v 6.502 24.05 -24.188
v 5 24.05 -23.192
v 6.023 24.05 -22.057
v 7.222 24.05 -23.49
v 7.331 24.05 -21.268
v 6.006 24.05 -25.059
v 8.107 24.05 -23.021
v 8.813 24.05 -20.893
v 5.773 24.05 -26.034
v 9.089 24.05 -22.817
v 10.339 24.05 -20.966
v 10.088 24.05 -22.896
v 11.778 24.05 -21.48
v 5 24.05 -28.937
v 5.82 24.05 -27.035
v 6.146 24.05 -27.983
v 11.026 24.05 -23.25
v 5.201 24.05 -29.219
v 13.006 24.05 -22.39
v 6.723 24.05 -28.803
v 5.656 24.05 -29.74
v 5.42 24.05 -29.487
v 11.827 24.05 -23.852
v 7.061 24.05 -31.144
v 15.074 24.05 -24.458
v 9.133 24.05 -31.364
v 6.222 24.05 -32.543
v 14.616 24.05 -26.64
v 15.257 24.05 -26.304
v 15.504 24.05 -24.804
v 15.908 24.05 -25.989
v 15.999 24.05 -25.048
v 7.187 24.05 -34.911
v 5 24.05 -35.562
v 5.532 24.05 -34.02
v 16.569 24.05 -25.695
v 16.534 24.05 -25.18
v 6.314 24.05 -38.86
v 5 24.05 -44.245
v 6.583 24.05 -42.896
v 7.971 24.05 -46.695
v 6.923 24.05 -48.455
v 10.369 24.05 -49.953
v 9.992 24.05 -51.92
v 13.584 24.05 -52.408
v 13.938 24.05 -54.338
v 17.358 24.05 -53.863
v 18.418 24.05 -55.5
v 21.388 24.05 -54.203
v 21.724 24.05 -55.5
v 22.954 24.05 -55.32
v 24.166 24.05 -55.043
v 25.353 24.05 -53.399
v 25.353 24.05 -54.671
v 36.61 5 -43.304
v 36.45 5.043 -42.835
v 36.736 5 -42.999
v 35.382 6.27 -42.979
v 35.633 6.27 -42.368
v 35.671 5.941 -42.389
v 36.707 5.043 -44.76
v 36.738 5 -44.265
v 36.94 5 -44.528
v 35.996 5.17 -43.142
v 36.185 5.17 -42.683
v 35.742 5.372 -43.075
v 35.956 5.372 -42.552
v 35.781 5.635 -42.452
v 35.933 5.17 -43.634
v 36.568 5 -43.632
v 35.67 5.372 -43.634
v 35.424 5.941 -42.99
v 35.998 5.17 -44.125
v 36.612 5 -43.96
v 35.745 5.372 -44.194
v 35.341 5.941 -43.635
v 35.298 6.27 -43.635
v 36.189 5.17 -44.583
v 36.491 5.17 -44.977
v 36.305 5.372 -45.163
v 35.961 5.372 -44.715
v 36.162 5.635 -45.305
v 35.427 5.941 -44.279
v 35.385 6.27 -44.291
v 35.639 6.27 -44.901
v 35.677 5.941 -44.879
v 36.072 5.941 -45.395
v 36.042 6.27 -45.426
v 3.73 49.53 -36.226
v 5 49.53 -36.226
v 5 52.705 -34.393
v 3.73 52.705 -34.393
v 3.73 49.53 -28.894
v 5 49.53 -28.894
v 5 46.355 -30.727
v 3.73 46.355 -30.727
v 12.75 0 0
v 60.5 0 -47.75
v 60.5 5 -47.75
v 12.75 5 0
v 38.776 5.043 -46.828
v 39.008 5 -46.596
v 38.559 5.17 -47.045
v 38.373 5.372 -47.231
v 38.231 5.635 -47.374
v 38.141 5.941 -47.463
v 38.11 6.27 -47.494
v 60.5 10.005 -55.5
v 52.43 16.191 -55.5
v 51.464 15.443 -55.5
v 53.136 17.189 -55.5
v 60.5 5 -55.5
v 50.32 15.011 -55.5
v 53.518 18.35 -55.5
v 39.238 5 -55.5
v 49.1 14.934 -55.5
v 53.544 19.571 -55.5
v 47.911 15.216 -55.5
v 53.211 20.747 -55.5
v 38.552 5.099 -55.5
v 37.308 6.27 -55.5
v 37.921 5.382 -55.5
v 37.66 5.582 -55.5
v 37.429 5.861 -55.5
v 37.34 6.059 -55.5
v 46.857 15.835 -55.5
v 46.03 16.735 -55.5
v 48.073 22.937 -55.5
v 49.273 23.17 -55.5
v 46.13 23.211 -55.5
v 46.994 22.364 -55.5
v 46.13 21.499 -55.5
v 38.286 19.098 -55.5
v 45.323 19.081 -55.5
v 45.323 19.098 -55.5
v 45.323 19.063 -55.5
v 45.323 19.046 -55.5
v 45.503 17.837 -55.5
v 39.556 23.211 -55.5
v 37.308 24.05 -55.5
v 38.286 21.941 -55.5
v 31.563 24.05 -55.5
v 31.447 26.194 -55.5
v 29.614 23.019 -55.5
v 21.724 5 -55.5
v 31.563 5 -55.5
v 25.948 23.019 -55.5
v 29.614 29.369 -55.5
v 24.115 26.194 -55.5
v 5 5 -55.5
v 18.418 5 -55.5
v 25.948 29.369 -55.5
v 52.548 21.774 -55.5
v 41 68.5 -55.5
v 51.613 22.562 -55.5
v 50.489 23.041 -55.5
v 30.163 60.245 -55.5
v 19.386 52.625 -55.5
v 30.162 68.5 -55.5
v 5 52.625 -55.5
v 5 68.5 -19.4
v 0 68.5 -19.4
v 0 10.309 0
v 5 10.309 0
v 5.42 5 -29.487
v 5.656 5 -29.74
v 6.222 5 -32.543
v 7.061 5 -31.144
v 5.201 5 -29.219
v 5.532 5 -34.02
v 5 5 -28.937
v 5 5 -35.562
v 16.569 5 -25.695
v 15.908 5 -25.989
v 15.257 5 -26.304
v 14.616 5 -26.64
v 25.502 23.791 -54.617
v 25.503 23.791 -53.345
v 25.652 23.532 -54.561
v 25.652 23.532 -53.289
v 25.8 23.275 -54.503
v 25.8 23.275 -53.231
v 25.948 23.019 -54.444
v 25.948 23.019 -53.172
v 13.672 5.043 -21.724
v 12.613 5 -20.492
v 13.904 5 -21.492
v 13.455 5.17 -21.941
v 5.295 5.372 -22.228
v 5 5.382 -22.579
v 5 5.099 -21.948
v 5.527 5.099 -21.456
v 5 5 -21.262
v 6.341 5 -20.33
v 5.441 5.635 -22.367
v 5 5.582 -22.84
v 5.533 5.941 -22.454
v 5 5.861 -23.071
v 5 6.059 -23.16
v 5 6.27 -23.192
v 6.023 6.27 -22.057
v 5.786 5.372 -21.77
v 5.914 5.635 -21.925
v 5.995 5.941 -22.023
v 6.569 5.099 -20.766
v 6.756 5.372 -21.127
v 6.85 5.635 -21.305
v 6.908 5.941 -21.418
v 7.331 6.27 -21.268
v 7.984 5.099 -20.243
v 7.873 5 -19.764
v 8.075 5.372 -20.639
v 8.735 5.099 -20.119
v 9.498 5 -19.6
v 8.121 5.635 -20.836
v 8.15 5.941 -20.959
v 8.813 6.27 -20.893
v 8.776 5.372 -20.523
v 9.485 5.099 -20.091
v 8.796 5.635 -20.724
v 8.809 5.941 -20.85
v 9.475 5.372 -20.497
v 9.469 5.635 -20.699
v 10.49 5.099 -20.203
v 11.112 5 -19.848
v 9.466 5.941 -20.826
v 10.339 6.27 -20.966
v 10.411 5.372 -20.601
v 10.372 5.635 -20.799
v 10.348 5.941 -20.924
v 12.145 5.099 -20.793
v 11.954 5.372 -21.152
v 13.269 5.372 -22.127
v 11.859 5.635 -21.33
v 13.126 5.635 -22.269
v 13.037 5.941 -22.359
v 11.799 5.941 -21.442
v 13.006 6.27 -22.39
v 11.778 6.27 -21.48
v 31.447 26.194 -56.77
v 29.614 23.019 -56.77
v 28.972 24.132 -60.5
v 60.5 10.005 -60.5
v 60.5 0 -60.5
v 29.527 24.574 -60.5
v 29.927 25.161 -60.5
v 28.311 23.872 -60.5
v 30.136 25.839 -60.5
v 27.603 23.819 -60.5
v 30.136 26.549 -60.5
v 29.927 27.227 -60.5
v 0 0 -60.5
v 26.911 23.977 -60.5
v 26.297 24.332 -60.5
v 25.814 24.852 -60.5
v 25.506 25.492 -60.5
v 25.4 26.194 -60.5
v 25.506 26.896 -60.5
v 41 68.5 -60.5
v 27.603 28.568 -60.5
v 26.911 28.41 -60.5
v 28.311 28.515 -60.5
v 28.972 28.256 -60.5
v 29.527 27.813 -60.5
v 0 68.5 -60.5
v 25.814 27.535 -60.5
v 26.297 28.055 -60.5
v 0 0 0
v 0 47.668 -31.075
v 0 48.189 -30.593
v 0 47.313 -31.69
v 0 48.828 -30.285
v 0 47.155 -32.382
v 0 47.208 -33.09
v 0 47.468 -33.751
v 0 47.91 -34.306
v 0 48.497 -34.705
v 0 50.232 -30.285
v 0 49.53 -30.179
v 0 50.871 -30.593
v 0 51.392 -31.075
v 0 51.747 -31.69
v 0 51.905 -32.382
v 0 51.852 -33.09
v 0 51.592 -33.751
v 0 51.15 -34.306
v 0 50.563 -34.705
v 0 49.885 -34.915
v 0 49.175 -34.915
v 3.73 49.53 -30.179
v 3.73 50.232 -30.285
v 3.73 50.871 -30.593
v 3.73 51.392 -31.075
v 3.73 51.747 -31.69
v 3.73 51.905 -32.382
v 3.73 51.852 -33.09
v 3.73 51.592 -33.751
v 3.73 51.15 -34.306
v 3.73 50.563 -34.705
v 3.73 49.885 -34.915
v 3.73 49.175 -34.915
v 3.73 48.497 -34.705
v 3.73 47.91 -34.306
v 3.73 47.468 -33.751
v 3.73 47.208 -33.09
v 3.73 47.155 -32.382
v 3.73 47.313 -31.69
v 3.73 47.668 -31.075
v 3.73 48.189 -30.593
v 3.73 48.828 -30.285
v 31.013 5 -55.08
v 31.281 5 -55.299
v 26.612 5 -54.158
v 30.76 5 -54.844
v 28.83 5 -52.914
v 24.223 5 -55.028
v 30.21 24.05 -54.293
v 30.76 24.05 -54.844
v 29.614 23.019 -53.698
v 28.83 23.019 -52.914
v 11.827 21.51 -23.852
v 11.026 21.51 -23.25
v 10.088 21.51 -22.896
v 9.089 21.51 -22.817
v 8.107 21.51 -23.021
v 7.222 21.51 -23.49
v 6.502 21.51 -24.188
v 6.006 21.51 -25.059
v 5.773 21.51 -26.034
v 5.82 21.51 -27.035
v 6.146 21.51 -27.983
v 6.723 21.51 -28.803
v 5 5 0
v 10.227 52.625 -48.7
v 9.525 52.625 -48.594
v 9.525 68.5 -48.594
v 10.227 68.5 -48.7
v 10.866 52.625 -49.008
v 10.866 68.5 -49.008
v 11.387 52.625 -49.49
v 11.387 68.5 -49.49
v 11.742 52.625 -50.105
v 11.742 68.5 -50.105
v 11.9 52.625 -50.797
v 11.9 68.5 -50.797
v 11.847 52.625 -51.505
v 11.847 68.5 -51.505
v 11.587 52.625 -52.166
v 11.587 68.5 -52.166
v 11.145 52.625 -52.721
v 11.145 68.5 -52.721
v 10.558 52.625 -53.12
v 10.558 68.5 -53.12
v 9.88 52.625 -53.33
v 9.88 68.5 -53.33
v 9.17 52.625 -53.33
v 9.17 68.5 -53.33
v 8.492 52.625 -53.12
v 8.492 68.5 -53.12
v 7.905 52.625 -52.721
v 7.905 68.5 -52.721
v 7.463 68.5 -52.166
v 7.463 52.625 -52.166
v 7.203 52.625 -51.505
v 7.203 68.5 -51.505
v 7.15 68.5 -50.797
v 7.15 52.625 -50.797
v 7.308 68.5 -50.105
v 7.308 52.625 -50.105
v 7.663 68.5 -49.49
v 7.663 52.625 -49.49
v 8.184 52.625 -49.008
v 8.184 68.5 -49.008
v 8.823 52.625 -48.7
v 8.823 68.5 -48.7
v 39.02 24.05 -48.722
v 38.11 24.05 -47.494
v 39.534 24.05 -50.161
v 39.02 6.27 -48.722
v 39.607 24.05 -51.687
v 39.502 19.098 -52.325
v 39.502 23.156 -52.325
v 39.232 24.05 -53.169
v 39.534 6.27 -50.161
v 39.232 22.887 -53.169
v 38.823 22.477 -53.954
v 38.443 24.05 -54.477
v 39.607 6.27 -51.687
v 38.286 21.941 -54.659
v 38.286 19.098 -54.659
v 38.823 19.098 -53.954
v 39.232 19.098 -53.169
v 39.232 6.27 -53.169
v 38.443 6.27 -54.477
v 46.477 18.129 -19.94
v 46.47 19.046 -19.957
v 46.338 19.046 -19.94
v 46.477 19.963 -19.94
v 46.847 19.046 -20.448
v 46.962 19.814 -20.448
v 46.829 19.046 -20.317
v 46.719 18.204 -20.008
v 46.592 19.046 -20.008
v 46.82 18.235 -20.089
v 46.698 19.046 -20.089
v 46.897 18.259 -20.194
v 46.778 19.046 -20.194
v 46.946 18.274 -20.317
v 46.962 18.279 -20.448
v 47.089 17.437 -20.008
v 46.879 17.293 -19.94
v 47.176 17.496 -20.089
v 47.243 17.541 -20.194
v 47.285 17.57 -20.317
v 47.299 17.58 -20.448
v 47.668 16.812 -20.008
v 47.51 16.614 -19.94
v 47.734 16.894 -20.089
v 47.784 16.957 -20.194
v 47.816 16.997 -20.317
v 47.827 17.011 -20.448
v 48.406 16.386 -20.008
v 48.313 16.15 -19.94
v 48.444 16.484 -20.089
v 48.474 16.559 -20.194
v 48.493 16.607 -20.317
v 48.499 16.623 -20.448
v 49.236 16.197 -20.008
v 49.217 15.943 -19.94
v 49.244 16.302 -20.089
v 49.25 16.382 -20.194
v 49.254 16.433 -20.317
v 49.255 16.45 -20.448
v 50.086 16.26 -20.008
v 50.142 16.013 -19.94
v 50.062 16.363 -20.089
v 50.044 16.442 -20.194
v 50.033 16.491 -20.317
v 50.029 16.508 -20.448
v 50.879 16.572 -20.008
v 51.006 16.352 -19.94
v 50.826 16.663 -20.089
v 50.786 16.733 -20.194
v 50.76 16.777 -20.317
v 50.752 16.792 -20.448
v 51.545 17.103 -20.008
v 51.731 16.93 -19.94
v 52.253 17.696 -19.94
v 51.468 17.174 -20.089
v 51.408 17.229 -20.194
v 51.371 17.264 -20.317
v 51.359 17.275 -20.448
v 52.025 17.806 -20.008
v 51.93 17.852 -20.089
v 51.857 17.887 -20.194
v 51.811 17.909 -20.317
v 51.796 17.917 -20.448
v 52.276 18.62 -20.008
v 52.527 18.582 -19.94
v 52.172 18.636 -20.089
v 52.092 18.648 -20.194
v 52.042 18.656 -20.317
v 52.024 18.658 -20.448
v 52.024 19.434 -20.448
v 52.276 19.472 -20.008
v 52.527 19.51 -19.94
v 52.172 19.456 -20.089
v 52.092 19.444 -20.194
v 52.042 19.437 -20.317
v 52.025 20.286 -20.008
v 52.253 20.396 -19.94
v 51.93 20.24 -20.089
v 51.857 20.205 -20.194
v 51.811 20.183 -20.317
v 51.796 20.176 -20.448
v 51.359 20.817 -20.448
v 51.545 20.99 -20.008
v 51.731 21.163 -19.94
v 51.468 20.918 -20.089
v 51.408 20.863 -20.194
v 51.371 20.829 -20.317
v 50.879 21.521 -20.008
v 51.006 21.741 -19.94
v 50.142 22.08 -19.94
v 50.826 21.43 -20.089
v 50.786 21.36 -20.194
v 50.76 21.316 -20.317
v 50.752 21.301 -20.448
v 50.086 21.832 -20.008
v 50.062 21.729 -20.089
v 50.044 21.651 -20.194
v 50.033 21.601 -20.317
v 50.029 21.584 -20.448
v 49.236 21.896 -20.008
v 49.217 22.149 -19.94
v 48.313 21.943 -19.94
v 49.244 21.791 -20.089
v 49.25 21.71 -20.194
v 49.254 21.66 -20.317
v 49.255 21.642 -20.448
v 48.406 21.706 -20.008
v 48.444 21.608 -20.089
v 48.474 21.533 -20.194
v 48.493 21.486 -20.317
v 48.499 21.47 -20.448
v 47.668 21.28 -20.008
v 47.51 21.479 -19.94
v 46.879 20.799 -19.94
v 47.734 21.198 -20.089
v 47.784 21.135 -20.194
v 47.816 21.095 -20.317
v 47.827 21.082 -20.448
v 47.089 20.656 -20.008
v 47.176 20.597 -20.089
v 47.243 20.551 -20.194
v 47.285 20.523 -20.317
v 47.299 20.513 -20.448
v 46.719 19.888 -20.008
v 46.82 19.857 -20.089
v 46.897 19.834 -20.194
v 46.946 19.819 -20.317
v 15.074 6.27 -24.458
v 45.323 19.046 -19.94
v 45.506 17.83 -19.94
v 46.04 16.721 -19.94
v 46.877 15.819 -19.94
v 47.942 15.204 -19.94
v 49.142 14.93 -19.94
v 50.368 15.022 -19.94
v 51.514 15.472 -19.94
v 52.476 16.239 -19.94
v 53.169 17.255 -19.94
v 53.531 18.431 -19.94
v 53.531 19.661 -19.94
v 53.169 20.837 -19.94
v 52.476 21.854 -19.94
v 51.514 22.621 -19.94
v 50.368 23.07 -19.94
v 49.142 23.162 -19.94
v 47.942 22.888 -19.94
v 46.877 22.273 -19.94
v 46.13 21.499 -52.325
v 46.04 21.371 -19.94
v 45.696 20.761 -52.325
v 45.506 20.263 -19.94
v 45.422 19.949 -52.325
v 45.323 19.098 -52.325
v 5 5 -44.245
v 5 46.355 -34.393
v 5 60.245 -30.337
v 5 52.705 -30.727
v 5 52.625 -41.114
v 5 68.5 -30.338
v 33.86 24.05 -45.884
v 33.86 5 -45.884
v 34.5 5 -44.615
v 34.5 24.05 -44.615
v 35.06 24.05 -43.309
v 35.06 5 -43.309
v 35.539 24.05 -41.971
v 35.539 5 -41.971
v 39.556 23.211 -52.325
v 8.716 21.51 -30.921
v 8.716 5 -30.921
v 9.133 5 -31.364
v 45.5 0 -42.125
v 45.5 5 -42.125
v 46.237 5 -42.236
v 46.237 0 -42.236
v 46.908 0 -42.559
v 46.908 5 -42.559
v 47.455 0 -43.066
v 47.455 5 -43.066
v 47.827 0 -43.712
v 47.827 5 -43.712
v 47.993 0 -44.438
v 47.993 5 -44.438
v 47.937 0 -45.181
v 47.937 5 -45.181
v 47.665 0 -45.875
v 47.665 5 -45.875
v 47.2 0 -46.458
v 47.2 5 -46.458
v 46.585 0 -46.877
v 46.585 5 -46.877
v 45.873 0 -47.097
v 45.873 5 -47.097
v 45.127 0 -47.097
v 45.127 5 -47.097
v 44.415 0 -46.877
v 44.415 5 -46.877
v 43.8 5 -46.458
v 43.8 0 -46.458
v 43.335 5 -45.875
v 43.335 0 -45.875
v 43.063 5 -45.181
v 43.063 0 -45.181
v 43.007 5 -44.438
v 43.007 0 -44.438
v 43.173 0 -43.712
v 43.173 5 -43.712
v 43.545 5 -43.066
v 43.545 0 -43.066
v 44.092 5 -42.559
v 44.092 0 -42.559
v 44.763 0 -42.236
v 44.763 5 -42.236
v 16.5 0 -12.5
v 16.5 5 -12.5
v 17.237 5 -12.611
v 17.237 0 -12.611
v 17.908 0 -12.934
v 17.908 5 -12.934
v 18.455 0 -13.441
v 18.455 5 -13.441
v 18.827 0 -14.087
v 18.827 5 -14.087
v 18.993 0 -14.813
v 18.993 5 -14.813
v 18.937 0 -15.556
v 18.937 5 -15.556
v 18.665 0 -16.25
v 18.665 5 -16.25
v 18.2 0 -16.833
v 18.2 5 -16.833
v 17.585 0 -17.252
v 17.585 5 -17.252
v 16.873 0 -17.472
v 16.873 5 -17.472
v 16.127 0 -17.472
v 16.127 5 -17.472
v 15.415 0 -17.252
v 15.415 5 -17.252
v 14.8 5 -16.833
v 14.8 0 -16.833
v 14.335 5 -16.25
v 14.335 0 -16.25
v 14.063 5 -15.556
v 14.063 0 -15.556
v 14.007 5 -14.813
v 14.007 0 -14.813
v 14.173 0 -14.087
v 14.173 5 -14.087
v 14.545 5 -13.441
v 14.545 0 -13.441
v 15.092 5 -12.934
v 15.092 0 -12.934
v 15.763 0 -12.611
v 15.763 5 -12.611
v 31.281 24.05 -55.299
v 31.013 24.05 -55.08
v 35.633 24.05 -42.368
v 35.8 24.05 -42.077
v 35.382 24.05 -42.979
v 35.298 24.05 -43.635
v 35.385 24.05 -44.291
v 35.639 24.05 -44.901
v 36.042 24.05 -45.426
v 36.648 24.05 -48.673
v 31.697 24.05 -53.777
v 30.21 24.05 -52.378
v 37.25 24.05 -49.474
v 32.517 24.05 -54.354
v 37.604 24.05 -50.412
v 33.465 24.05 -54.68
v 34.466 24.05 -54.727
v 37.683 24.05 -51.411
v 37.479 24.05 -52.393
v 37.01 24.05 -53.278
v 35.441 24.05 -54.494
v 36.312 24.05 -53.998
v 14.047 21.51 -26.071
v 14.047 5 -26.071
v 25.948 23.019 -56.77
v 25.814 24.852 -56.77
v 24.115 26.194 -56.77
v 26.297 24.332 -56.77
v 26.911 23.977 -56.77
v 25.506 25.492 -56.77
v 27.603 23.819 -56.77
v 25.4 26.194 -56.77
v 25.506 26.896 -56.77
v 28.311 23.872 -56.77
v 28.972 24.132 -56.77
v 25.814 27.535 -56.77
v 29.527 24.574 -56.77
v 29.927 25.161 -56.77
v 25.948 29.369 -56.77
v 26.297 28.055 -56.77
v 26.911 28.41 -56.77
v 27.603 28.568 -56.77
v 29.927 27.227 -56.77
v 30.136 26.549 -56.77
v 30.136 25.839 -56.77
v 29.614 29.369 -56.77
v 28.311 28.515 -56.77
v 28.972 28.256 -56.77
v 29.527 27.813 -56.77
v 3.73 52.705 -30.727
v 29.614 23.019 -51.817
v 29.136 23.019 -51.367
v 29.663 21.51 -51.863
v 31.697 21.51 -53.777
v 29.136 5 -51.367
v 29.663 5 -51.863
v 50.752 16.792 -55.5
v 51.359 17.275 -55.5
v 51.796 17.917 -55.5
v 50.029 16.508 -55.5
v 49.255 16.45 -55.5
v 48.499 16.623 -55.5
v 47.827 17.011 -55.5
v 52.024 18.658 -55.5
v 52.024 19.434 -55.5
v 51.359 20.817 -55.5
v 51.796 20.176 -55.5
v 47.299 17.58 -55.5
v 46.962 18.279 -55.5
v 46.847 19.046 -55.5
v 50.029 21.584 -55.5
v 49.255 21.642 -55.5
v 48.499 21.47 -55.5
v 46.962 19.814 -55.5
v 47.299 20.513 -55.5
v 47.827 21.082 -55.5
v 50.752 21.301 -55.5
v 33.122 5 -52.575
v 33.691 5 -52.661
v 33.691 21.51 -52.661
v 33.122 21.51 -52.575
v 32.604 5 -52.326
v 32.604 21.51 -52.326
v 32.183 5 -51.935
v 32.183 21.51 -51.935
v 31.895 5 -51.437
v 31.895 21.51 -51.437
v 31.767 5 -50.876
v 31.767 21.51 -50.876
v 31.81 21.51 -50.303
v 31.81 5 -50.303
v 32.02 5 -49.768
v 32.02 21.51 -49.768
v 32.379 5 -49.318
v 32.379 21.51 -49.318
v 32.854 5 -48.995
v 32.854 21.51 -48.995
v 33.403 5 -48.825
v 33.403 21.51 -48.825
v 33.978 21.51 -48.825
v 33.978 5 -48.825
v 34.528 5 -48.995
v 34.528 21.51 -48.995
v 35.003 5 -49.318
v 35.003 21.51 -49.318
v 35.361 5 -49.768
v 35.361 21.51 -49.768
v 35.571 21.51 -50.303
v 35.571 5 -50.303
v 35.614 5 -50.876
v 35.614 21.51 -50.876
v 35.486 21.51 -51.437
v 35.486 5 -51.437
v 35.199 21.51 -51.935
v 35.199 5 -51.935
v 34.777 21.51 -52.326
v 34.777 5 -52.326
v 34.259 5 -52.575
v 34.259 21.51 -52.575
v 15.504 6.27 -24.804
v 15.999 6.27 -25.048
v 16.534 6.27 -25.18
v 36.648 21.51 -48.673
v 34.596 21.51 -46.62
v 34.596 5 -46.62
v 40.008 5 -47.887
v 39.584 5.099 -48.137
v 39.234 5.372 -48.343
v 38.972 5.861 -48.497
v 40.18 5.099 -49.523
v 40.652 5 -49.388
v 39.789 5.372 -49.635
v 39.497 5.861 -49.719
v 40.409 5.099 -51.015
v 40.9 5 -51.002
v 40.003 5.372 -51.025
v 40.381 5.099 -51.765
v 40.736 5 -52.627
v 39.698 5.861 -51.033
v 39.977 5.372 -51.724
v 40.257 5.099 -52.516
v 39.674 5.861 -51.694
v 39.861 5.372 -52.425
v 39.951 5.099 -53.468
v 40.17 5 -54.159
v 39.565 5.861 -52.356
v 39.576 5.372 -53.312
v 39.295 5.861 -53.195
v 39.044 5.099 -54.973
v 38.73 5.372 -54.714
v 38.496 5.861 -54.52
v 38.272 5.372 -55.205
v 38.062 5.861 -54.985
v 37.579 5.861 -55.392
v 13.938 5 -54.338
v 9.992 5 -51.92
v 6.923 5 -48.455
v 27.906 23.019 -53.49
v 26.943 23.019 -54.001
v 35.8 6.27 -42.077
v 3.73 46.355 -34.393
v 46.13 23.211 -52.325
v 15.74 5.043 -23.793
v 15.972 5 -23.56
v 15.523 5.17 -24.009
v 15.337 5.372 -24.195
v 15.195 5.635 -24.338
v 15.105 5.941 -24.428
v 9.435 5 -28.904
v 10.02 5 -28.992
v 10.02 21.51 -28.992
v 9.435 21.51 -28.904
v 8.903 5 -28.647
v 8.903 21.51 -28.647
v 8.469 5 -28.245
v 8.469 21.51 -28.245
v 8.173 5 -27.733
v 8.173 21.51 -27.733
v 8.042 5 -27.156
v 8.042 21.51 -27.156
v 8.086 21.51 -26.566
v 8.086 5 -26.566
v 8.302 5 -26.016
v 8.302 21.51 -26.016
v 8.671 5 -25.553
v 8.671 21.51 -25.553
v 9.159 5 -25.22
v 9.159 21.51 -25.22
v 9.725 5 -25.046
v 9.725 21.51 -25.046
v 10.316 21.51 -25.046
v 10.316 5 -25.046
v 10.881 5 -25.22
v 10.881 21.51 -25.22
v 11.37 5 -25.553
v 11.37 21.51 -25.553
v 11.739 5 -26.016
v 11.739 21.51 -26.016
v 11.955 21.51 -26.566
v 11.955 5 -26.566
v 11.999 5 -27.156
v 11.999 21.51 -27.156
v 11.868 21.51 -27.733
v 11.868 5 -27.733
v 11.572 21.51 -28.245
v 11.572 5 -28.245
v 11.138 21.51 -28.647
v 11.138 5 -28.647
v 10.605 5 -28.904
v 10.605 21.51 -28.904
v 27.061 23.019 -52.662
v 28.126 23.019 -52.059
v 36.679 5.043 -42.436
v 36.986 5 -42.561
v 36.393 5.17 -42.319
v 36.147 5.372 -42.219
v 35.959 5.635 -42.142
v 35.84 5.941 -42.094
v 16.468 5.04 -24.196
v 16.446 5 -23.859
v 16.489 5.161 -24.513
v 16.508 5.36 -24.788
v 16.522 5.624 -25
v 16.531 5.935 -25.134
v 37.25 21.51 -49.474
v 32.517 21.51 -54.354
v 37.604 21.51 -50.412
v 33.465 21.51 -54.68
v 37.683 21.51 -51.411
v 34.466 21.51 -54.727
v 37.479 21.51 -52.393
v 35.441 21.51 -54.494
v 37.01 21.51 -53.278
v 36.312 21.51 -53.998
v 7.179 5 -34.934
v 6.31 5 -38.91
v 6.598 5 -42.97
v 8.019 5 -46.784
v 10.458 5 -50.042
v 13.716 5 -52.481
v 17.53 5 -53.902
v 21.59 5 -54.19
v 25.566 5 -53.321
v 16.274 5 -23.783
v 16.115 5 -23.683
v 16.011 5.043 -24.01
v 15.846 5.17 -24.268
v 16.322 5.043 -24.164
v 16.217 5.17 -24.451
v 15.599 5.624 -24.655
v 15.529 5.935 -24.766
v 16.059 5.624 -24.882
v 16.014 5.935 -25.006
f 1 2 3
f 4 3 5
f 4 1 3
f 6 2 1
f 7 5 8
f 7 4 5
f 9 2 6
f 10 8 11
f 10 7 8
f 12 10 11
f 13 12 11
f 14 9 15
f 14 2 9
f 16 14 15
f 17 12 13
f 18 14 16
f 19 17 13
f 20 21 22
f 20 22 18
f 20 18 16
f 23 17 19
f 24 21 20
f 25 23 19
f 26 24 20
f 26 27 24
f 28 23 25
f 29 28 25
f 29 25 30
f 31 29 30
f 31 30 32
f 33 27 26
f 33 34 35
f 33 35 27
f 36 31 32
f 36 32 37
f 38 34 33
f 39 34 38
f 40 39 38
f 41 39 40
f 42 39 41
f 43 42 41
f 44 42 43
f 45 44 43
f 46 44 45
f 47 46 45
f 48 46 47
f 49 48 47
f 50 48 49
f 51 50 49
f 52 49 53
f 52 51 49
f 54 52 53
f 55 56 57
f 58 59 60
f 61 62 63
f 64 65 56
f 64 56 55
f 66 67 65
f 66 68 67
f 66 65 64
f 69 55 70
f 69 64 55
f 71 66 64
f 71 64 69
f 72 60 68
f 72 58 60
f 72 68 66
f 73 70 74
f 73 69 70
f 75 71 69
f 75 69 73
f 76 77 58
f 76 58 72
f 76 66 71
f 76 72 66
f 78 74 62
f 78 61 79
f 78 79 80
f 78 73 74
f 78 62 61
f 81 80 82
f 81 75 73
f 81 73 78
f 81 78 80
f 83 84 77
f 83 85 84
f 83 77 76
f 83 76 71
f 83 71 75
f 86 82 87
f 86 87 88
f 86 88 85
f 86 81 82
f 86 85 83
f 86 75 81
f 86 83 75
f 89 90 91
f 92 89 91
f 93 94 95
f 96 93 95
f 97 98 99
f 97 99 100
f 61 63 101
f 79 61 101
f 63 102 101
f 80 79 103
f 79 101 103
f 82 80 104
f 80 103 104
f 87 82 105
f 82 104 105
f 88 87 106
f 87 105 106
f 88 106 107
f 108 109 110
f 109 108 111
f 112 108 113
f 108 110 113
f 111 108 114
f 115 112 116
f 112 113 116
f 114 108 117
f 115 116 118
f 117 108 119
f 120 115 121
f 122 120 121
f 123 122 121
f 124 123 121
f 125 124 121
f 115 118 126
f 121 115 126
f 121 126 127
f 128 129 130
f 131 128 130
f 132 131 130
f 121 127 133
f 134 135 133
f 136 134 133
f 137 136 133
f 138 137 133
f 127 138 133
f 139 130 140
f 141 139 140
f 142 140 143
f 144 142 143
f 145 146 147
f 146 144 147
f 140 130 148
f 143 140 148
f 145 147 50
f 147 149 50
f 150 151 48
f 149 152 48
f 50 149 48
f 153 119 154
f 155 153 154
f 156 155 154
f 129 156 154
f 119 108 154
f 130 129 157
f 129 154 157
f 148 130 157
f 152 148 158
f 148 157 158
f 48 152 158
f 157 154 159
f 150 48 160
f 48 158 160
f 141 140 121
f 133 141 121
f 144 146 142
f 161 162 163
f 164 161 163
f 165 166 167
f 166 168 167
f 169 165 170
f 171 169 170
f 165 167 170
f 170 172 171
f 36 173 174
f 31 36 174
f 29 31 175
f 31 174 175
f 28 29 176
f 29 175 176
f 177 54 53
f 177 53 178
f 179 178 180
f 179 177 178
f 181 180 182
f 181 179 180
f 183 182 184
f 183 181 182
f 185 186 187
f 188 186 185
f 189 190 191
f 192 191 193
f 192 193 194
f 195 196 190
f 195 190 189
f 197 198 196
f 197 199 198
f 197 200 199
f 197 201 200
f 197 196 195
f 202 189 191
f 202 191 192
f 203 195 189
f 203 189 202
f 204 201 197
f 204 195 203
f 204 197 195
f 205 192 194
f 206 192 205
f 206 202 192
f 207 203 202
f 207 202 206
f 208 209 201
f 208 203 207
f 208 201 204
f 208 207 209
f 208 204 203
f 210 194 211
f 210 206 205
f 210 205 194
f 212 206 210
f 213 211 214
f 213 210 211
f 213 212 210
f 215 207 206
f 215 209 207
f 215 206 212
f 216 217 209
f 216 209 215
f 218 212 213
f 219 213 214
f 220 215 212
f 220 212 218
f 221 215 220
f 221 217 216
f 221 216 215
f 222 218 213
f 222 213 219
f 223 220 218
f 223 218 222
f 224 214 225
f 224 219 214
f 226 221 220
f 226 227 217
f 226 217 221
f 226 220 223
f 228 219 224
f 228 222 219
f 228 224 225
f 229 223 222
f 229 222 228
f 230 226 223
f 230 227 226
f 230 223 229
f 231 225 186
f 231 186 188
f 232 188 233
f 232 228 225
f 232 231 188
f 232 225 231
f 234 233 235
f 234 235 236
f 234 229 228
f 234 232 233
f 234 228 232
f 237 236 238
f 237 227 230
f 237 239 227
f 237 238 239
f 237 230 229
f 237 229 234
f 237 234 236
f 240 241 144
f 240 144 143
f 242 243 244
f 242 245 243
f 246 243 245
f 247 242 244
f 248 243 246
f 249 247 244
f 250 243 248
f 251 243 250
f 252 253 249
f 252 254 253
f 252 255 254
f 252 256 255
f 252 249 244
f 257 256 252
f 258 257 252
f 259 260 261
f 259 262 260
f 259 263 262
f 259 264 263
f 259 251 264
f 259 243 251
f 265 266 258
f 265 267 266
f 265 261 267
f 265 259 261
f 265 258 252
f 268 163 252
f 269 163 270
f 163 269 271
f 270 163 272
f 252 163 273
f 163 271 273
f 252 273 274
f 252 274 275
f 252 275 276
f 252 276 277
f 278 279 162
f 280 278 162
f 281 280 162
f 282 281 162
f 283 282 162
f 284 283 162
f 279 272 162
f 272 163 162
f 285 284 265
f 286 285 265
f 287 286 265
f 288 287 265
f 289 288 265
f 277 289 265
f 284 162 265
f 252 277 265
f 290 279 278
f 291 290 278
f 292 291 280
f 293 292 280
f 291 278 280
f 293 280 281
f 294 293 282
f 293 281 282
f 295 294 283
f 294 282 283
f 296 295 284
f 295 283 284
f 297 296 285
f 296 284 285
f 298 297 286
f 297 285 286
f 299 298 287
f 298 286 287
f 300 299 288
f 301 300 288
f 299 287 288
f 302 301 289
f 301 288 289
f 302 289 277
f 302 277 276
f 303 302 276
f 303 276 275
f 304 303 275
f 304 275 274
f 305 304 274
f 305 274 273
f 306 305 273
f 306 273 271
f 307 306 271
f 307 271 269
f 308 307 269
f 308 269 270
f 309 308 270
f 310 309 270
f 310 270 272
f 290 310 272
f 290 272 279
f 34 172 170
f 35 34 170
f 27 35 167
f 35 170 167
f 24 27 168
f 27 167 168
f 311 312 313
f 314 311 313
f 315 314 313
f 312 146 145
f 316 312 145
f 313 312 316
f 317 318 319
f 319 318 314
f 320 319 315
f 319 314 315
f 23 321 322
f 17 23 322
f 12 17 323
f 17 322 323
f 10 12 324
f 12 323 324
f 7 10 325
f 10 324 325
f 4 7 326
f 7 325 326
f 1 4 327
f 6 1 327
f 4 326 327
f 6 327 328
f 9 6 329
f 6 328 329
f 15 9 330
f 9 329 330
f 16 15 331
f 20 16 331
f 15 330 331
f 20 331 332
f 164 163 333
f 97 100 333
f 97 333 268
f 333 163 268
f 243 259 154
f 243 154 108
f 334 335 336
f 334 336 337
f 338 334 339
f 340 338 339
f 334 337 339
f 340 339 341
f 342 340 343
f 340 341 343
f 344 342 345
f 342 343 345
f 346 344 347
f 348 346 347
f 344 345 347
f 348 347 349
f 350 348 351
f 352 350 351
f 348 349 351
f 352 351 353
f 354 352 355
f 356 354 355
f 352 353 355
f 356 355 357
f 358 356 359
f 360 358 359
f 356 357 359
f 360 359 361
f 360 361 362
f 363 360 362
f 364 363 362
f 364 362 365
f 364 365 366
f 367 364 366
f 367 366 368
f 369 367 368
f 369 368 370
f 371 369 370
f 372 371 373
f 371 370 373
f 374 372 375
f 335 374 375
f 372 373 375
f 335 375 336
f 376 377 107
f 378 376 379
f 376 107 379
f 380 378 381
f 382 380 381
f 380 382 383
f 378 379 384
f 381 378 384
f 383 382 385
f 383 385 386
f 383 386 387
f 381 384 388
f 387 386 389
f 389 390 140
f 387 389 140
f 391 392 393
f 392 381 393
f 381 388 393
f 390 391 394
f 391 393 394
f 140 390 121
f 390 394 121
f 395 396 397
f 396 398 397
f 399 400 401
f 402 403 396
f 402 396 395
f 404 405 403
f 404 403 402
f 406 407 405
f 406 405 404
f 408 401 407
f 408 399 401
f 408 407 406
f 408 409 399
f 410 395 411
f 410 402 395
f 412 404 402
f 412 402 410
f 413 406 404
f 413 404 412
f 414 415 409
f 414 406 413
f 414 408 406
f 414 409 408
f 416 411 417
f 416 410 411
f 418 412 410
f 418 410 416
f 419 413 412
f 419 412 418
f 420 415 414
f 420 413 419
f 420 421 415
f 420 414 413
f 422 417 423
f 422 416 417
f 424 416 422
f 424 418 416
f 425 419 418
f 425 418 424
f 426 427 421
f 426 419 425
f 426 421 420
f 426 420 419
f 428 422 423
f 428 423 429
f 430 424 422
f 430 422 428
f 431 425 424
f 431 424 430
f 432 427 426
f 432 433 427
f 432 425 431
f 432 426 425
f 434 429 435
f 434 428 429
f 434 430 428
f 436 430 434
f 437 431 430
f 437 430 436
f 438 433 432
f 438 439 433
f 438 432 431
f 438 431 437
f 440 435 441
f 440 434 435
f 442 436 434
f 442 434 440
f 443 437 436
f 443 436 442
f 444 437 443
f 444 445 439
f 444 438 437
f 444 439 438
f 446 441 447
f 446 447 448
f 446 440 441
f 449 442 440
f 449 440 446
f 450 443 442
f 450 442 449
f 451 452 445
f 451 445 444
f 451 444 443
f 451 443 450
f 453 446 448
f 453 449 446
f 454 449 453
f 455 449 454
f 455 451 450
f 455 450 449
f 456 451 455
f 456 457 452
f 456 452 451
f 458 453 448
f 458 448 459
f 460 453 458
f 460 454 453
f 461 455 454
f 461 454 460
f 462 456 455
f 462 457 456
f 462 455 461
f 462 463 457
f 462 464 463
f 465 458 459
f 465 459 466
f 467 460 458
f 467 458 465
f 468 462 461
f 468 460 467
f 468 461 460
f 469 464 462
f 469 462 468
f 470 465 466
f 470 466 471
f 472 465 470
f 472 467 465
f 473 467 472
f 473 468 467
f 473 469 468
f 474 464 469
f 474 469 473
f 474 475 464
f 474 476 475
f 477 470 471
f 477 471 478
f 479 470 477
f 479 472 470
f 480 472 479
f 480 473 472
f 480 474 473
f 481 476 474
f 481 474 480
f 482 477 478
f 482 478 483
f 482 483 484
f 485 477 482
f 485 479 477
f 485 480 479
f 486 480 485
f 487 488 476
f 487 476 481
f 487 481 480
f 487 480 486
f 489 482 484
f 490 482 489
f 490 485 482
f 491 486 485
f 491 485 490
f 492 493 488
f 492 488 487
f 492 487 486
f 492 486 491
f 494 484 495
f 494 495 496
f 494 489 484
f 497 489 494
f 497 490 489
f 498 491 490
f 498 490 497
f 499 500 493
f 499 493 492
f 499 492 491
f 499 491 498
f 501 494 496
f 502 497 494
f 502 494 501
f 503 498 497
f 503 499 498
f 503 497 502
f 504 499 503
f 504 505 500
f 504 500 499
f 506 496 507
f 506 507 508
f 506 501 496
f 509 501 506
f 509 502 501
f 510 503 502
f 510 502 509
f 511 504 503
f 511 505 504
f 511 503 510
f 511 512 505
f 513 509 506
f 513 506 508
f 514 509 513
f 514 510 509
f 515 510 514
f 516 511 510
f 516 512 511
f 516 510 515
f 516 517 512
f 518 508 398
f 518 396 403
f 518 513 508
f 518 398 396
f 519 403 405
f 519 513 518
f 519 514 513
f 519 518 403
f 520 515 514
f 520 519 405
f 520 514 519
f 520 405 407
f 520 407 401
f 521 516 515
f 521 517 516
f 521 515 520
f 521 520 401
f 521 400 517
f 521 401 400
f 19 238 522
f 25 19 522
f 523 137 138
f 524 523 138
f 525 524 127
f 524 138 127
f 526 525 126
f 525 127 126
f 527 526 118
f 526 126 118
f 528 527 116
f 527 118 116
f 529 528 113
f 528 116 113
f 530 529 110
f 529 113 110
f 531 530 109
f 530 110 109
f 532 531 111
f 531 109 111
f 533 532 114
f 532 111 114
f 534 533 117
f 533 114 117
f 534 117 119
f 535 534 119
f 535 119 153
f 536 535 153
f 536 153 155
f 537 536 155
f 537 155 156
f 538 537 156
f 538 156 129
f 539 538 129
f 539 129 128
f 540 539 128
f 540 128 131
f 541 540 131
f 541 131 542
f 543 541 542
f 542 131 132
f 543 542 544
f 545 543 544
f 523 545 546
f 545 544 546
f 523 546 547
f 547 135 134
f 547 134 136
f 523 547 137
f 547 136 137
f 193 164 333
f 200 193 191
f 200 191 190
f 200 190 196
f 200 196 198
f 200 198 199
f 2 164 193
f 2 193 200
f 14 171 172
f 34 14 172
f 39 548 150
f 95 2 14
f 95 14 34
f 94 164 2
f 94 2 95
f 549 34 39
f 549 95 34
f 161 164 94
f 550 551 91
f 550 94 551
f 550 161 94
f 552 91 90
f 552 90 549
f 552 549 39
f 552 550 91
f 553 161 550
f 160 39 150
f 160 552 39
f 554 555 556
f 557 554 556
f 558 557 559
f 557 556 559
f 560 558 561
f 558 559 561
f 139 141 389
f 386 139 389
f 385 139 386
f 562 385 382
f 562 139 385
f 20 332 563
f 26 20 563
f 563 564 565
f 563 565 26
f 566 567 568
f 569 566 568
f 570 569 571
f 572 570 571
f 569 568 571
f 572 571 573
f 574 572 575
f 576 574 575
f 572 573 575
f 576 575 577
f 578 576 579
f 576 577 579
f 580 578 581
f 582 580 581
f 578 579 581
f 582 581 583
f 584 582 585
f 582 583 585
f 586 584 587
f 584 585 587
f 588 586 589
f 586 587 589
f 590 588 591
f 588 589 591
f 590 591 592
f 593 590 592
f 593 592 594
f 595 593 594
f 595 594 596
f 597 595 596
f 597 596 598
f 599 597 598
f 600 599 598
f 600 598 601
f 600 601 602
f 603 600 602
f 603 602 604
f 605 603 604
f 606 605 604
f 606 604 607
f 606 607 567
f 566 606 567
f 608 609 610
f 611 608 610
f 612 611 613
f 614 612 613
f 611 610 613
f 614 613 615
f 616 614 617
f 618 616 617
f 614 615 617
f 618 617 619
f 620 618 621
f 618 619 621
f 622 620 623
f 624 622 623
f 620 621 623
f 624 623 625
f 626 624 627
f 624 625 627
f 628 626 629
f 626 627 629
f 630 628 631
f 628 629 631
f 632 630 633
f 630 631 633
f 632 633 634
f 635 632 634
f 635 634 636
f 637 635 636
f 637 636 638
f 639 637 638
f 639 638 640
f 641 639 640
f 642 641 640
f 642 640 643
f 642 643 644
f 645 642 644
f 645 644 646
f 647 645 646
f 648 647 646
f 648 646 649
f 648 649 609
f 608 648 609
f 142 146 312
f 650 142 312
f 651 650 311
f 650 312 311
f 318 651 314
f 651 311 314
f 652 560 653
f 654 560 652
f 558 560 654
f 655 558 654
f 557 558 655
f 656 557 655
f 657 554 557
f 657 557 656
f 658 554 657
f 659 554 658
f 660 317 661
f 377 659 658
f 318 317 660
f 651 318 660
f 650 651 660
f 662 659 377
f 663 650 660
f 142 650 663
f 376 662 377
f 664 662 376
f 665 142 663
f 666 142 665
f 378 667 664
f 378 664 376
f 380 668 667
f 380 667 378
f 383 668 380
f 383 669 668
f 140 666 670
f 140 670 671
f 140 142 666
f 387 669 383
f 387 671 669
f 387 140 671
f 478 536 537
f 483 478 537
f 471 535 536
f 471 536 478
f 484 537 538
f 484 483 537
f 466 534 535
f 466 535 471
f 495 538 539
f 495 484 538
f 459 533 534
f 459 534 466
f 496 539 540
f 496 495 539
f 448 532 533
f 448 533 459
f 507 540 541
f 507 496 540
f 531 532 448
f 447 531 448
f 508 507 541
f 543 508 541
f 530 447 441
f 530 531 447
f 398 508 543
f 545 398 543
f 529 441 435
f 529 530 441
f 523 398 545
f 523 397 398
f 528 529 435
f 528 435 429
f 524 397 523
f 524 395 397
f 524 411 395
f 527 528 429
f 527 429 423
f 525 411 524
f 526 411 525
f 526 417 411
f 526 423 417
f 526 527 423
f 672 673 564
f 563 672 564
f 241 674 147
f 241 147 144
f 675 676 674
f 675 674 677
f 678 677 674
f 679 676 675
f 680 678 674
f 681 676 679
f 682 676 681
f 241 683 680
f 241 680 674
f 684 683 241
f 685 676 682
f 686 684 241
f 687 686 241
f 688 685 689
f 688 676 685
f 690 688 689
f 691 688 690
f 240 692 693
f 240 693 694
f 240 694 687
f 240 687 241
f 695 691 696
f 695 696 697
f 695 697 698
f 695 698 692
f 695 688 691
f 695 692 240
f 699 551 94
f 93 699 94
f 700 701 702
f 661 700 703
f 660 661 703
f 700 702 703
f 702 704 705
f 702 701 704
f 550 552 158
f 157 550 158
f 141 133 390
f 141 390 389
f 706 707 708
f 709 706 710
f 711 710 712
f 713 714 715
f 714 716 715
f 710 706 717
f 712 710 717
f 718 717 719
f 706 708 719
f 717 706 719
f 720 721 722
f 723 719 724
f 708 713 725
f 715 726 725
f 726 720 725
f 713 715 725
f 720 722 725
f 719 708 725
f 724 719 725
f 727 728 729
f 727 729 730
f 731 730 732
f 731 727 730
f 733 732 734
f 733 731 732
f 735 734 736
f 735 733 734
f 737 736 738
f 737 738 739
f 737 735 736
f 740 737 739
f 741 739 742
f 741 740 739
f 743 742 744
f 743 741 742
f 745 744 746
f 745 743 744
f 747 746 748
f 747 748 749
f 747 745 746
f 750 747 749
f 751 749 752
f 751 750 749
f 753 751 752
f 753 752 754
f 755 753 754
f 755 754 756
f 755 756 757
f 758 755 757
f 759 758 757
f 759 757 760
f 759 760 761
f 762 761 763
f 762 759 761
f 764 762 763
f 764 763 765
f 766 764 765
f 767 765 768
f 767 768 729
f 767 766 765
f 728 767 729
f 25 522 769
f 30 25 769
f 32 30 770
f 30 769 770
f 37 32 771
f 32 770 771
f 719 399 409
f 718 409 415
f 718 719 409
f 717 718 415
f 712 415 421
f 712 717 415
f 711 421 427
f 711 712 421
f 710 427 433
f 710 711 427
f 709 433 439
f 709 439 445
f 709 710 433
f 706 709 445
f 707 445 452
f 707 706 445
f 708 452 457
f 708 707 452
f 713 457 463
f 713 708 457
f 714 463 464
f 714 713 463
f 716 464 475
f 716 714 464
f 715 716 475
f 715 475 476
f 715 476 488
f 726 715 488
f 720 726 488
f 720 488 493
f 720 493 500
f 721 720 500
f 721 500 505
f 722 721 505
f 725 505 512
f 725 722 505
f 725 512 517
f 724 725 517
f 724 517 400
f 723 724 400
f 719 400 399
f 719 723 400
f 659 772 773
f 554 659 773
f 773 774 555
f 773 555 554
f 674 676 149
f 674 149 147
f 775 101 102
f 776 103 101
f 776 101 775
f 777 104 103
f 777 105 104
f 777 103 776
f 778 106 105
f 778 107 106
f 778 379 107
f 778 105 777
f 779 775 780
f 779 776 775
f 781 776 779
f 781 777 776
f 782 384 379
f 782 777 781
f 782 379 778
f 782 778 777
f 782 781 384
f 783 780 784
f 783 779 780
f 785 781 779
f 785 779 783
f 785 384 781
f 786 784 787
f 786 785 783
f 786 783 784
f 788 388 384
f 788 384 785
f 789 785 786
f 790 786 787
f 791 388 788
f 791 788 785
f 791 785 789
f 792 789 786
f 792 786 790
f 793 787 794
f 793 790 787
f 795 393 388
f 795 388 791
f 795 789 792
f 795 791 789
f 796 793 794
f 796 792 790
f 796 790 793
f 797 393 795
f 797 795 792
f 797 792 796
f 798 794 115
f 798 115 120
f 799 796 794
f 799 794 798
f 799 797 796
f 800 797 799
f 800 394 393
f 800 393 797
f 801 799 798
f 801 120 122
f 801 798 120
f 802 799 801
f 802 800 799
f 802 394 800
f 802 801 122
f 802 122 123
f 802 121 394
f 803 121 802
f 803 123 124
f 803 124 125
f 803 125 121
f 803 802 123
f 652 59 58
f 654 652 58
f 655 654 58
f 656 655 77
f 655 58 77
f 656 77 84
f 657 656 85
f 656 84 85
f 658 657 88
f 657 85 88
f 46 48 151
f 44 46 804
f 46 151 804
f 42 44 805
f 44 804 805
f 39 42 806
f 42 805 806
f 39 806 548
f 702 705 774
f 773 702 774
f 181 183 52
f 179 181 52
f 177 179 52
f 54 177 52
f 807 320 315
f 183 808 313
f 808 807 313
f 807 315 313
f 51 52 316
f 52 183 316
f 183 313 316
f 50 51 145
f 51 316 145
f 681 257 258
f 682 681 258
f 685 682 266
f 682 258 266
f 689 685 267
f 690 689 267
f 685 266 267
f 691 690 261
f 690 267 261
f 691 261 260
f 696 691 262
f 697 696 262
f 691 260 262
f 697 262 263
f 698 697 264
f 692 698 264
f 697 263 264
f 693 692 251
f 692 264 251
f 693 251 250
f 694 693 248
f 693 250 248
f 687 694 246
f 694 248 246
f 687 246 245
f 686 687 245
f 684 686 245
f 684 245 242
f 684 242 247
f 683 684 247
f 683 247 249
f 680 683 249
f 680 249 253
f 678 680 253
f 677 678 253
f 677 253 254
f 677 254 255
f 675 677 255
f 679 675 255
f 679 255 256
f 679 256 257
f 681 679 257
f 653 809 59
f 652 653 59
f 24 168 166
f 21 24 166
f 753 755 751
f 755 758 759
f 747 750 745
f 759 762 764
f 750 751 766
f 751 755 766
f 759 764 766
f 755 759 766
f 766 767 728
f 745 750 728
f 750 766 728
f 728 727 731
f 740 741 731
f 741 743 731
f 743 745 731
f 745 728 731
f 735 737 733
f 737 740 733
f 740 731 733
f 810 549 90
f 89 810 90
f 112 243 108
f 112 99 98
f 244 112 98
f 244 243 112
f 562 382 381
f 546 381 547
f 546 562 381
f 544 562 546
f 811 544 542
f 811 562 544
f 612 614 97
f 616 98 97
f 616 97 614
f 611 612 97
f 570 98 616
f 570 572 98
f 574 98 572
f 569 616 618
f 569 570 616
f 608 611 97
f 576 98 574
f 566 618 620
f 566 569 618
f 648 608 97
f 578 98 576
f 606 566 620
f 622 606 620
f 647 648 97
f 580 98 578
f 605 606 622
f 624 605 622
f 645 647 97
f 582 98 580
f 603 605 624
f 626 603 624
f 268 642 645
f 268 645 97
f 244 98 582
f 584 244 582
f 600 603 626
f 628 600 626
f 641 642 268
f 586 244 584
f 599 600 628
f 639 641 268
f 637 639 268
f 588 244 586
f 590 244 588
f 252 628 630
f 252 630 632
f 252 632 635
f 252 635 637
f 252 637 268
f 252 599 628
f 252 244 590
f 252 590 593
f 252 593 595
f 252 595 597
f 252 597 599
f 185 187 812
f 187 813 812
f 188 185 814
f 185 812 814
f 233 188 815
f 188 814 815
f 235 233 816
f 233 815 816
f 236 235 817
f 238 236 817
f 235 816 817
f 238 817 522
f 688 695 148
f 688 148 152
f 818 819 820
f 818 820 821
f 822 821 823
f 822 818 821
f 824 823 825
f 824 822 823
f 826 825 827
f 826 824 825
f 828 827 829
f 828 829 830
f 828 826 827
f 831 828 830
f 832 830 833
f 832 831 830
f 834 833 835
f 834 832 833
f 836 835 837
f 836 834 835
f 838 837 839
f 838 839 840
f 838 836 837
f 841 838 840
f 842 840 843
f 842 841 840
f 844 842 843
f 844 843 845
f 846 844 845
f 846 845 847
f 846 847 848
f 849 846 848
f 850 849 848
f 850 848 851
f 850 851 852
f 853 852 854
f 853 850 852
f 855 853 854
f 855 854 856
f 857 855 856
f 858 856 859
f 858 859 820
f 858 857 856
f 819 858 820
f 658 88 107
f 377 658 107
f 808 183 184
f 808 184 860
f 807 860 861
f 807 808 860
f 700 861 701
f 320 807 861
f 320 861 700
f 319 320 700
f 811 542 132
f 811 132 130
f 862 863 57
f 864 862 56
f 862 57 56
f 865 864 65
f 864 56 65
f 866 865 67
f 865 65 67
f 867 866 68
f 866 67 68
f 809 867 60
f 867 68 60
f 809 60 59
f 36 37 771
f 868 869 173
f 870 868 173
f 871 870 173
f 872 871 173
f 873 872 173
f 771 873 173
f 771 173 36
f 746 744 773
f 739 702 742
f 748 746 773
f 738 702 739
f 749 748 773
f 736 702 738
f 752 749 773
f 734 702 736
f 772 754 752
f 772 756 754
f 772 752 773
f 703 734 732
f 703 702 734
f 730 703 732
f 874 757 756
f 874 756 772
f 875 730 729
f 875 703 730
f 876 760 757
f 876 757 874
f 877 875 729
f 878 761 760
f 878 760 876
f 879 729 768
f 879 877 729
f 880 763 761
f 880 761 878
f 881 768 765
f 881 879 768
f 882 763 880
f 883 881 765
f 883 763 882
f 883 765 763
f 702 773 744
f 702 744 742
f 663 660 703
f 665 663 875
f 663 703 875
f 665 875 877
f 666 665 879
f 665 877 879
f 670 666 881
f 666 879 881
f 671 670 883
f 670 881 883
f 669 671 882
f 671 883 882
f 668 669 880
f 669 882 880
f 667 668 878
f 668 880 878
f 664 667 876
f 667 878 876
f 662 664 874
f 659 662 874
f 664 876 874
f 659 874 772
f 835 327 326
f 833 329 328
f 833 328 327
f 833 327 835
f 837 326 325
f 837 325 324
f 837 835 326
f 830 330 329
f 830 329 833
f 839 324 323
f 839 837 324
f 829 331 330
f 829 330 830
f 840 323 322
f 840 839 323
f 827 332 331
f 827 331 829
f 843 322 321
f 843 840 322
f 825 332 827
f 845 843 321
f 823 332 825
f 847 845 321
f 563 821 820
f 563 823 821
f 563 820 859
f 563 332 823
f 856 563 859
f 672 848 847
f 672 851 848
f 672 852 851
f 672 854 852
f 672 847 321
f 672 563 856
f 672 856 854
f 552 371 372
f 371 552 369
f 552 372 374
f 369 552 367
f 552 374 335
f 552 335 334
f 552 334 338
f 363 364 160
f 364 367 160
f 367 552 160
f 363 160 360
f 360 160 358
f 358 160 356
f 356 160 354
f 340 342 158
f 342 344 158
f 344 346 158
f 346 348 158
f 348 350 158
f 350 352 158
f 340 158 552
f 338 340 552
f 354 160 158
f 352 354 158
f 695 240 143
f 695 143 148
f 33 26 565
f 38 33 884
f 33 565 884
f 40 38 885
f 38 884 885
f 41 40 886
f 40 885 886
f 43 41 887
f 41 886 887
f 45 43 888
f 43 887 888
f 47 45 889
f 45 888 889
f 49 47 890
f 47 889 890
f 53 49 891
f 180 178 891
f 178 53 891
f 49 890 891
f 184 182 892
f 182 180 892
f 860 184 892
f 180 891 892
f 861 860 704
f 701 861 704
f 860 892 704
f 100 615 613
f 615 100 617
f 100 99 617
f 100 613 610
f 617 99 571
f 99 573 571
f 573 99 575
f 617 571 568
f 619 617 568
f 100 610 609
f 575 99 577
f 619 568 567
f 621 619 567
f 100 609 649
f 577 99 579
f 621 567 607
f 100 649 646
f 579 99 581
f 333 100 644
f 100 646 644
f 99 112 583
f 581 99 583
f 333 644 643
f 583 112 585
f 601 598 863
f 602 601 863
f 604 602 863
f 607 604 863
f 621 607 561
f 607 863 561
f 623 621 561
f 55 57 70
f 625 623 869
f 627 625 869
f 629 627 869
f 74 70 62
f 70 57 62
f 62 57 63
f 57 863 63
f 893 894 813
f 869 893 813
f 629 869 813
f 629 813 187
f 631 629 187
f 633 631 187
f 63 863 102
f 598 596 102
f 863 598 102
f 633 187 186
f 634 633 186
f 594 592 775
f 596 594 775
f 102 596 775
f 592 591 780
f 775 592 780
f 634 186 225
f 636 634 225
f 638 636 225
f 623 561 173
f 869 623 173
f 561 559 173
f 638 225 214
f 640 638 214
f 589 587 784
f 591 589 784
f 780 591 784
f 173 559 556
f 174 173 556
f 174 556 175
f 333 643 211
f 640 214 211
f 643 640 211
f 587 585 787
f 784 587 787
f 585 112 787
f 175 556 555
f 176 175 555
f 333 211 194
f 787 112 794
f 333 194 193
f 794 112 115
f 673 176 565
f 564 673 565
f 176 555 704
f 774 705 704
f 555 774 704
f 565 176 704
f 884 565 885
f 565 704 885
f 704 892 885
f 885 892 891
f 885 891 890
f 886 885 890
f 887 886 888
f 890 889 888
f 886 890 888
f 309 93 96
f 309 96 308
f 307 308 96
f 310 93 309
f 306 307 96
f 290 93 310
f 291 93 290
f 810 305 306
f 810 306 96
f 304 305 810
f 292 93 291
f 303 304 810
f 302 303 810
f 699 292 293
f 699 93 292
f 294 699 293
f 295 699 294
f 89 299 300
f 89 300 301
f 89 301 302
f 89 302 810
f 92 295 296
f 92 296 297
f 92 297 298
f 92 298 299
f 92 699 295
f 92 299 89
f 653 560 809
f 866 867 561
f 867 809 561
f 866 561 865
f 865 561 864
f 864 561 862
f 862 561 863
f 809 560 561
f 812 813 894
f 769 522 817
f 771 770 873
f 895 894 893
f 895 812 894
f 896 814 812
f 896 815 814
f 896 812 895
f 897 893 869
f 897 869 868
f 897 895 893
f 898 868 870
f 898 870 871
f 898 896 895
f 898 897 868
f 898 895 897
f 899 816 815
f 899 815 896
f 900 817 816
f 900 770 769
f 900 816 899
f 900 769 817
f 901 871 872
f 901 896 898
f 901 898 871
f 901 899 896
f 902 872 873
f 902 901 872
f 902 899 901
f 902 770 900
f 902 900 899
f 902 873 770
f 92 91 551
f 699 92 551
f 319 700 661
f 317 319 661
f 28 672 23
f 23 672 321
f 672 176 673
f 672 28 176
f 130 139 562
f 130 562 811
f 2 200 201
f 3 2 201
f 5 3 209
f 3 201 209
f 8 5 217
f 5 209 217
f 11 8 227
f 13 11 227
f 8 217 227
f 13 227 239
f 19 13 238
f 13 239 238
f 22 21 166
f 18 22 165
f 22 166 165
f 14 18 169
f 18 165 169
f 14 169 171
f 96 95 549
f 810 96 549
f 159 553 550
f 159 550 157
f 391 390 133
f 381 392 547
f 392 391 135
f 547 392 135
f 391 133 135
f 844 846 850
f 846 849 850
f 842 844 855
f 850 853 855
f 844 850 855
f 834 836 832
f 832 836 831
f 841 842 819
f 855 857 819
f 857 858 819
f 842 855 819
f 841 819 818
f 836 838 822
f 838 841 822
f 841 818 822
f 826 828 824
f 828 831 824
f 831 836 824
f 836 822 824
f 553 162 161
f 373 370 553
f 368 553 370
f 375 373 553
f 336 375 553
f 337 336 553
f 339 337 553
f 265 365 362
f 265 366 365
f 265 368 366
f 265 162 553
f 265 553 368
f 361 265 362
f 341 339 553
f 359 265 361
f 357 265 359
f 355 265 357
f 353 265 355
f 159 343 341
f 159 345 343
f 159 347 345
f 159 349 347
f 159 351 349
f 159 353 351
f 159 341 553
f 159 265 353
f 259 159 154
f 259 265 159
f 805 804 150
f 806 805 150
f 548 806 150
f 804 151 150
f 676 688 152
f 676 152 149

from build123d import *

# Parameters (mm, degrees)
BOSS_EXTRUDE1_DEPTH     = 5
BOSS_EXTRUDE2_DEPTH     = 5
BOSS_EXTRUDE3_DEPTH     = 5
SKETCH6_R               = 2.5
CUT_EXTRUDE1_DEPTH      = 107.549284371
SKETCH9_R               = 4.1275
SKETCH9_R_2             = 2.6035
BOSS_EXTRUDE5_DEPTH     = 35.56
FILLET1_R               = 0.508
BOSS_EXTRUDE6_DEPTH     = 19.05
SKETCH15_R              = 2.38125
BOSS_EXTRUDE7_DEPTH     = 15.875
CHAMFER2_SIZE           = 7.62
FILLET2_R               = 1.27
SKETCH16_W              = 7.844007501
SKETCH16_H              = 4.112882263
BOSS_EXTRUDE8_DEPTH     = 3.175
CHAMFER3_SIZE           = 1.27
SKETCH17_R              = 1.984375
SKETCH17_R_2            = 1.9288125
BOSS_EXTRUDE9_DEPTH     = 16.51
CUT_EXTRUDE2_REACH      = 111.603
SKETCH18_R              = 2.38125
CUT_EXTRUDE3_REACH      = 111.603
SKETCH19_R              = 2.38125
CUT_EXTRUDE4_DEPTH      = 4.13271
CUT_EXTRUDE4_DEPTH_BACK = 1.27
CUT_EXTRUDE5_DEPTH      = 1.27


with BuildPart() as part:
    # Sketch1 → Boss-Extrude1 (new body)
    with BuildSketch(Plane(origin=(0, 0, 0), x_dir=(1, 0, 0), z_dir=(0, 1, 0))):
        Polygon((0, 0), (0, 60.5), (60.5, 60.5), (60.5, 47.75), (12.75, 0), align=None)
    extrude(amount=BOSS_EXTRUDE1_DEPTH)

    # Sketch4 → Boss-Extrude2 (add)
    with BuildSketch(Plane.ZY):
        Polygon((-60.5, 5), (-60.5, 68.5), (-19.4, 68.5), (0, 10.308629506), (0, 5), align=None)
    extrude(amount=-BOSS_EXTRUDE2_DEPTH)

    # Sketch5 → Boss-Extrude3 (add)
    with BuildSketch(Plane(origin=(0, 0, -60.5), x_dir=(-1, 0, 0), z_dir=(0, 0, -1))):
        Polygon((-5, 5), (-5, 68.5), (-41, 68.5), (-60.5, 10.004653177), (-60.5, 5), align=None)
    extrude(amount=-BOSS_EXTRUDE3_DEPTH)

    # Sketch6 → Cut-Extrude1 (cut, through all)
    with BuildSketch(Plane(origin=(0, 5, 0), x_dir=(1, 0, 0), z_dir=(0, 1, 0))):
        with Locations(Location((16.5, 15, 0), (0, 0, 270))):
            Circle(SKETCH6_R)
        with Locations(Location((45.5, 44.625, 0), (0, 0, 270))):
            Circle(SKETCH6_R)
    extrude(amount=-CUT_EXTRUDE1_DEPTH, mode=Mode.SUBTRACT)

    # Sketch9 → Boss-Extrude5 (add)
    with BuildSketch(Plane.XY.offset(-55.5)):
        with Locations(Location((49.45, 19.0462, 0), (0, 0, 180))):
            Circle(SKETCH9_R)
        with Locations(Location((49.45, 19.0462, 0), (0, 0, 180))):
            Circle(SKETCH9_R_2, mode=Mode.SUBTRACT)
    extrude(amount=BOSS_EXTRUDE5_DEPTH)

    # Fillet1
    fillet1_edges = [part.edges().sort_by_distance(p)[0] for p in [
        (52.0535, 19.0462, -19.94),
    ]]
    fillet(fillet1_edges, radius=FILLET1_R)

    # Sketch14 → Boss-Extrude6 (add)
    with BuildSketch(Plane(origin=(0, 5, 0), x_dir=(1, 0, 0), z_dir=(0, 1, 0))):
        with BuildLine():
            Line((6.722962691, 28.802730135), (9.132707699, 31.364136576))
            ThreePointArc((9.132707699, 31.364136576), (10.457950503, 50.042049497), (29.135863424, 51.367292301))
            Line((29.135863424, 51.367292301), (31.697269865, 53.777037309))
            ThreePointArc((31.697269865, 53.777037309), (36.686417723, 53.662894944), (36.648367319, 48.672586637))
            Line((36.648367319, 48.672586637), (33.860208422, 45.884427741))
            ThreePointArc((33.860208422, 45.884427741), (34.790141211, 43.96666613), (35.539002262, 41.971223395))
            Line((35.539002262, 41.971223395), (35.799607225, 42.077391474))
            Line((35.799607225, 42.077391474), (35.633459083, 42.367636838))
            ThreePointArc((35.633459083, 42.367636838), (35.320181387, 43.965693178), (36.041784088, 45.425561844))
            Line((36.041784088, 45.425561844), (38.110219678, 47.493997435))
            ThreePointArc((38.110219678, 47.493997435), (38.110219678, 54.843851927), (30.760365187, 54.843851927))
            Line((30.760365187, 54.843851927), (28.830026438, 52.913513178))
            ThreePointArc((28.830026438, 52.913513178), (8.980759009, 50.993661336), (7.060907167, 31.144393908))
            Line((7.060907167, 31.144393908), (5.656148073, 29.739634813))
            ThreePointArc((5.656148073, 29.739634813), (5.656148073, 22.389780322), (13.006002565, 22.389780322))
            Line((13.006002565, 22.389780322), (15.074438156, 24.458215912))
            ThreePointArc((15.074438156, 24.458215912), (15.744974902, 24.939184047), (16.534306822, 25.179818613))
            Line((16.534306822, 25.179818613), (16.568898656, 25.694636548))
            ThreePointArc((16.568898656, 25.694636548), (15.581109404, 26.144220149), (14.615572259, 26.639791578))
            Line((14.615572259, 26.639791578), (11.827413363, 23.851632681))
            ThreePointArc((11.827413363, 23.851632681), (6.837105056, 23.813582277), (6.722962691, 28.802730135))
        make_face()
    extrude(amount=BOSS_EXTRUDE6_DEPTH)

    # Sketch15 → Boss-Extrude7 (add)
    with BuildSketch(Plane(origin=(0, 68.5, 0), x_dir=(1, 0, 0), z_dir=(0, 1, 0))):
        Polygon((5, 55.5), (5, 30.3375), (30.1625, 55.5), align=None)
        with Locations(Location((9.525, 50.975, 0), (0, 0, 270))):
            Circle(SKETCH15_R, mode=Mode.SUBTRACT)
    extrude(amount=-BOSS_EXTRUDE7_DEPTH)

    # Chamfer2
    chamfer2_edges = [part.edges().sort_by_distance(p)[0] for p in [
        (17.58125, 52.625, -42.91875),
    ]]
    chamfer(chamfer2_edges, length=CHAMFER2_SIZE)

    # Fillet2
    fillet2_edges = [part.edges().sort_by_distance(p)[0] for p in [
        (15.744974902, 5, -24.939184047),
        (14.04022036, 5, -23.423998117),
        (8.812852099, 5, -20.893477035),
        (35.320181387, 5, -43.965693178),
        (35.716533154, 5, -42.222514156),
        (37.076001883, 5, -46.45977964),
        (39.606522965, 5, -51.687147901),
    ]]
    fillet(fillet2_edges, radius=FILLET2_R)

    # Sketch16 → Boss-Extrude8 (add)
    with BuildSketch(Plane.XY.offset(-55.5)):
        with Locations((42.208447341, 21.154254949)):
            Rectangle(SKETCH16_W, SKETCH16_H)
    extrude(amount=BOSS_EXTRUDE8_DEPTH)

    # Chamfer3
    chamfer3_edges = [part.edges().sort_by_distance(p)[0] for p in [
        (38.28644359, 23.21069608, -55.07937031),
    ]]
    chamfer(chamfer3_edges, length=CHAMFER3_SIZE)

    # Sketch17 → Boss-Extrude9 (add)
    # profile 1 of 2: a face of its own
    with BuildSketch(Plane(origin=(0, 5, 0), x_dir=(1, 0, 0), z_dir=(0, 1, 0))):
        with BuildLine():
            Line((14.046968971, 26.071188289), (8.715956726, 30.921156666))
            Line((8.715956726, 30.921156666), (6.722962691, 28.802730135))
            ThreePointArc((6.722962691, 28.802730135), (6.837105056, 23.813582277), (11.827413363, 23.851632681))
            Line((11.827413363, 23.851632681), (14.046968971, 26.071188289))
        make_face()
        with Locations(Location((10.020377911, 27.007841876, 0), (0, 0, 90))):
            Circle(SKETCH17_R, mode=Mode.SUBTRACT)
    # profile 2 of 2: a face of its own
    with BuildSketch(Plane(origin=(0, 5, 0), x_dir=(1, 0, 0), z_dir=(0, 1, 0))):
        with BuildLine():
            Line((31.697269865, 53.777037309), (29.66316707, 51.863374183))
            Line((29.66316707, 51.863374183), (34.595934869, 46.620154187))
            Line((34.595934869, 46.620154187), (36.648367319, 48.672586637))
            ThreePointArc((36.648367319, 48.672586637), (36.686417723, 53.662894944), (31.697269865, 53.777037309))
        make_face()
        with Locations(Location((33.690847255, 50.732351927, 0), (0, 0, 90))):
            Circle(SKETCH17_R_2, mode=Mode.SUBTRACT)
    extrude(amount=BOSS_EXTRUDE9_DEPTH)

    # Sketch18 → Cut-Extrude2 (cut, up to next)
    with BuildSketch(Plane.ZY, mode=Mode.PRIVATE) as cut_extrude2_sk1:
        with Locations((-32.56, 49.53)):
            Circle(SKETCH18_R)
    cut_extrude2_tool1 = extrude(cut_extrude2_sk1.sketch, amount=-CUT_EXTRUDE2_REACH, mode=Mode.PRIVATE) & part.part
    add(cut_extrude2_tool1.solids().sort_by_distance((0, 49.53, -32.56))[0], mode=Mode.SUBTRACT)

    # Sketch19 → Cut-Extrude3 (cut, up to next)
    with BuildSketch(Plane(origin=(0, 0, -60.5), x_dir=(-1, 0, 0), z_dir=(0, 0, -1)), mode=Mode.PRIVATE) as cut_extrude3_sk1:
        with Locations((-27.78125, 26.19375)):
            Circle(SKETCH19_R)
    cut_extrude3_tool1 = extrude(cut_extrude3_sk1.sketch, amount=-CUT_EXTRUDE3_REACH, mode=Mode.PRIVATE) & part.part
    add(cut_extrude3_tool1.solids().sort_by_distance((27.78125, 26.19375, -60.5))[0], mode=Mode.SUBTRACT)

    # Sketch20 → Cut-Extrude4 (cut, two sides: drawn at the far end of the back side and taken through both)
    with BuildSketch(Plane.XY.offset(-55.5).offset(-CUT_EXTRUDE4_DEPTH_BACK)):
        Polygon((31.447424209, 26.19375), (29.614337105, 29.36875), (25.948162895, 29.36875), (24.115075791, 26.19375), (25.948162895, 23.01875), (29.614337105, 23.01875), align=None)
    extrude(amount=CUT_EXTRUDE4_DEPTH + CUT_EXTRUDE4_DEPTH_BACK, mode=Mode.SUBTRACT)

    # Sketch21 → Cut-Extrude5 (cut)
    with BuildSketch(Plane(origin=(5, 0, 0), x_dir=(0, 0, -1), z_dir=(1, 0, 0))):
        Polygon((34.393087105, 52.705), (30.726912895, 52.705), (28.893825791, 49.53), (30.726912895, 46.355), (34.393087105, 46.355), (36.226174209, 49.53), align=None)
    extrude(amount=-CUT_EXTRUDE5_DEPTH, mode=Mode.SUBTRACT)


solid = part.part
